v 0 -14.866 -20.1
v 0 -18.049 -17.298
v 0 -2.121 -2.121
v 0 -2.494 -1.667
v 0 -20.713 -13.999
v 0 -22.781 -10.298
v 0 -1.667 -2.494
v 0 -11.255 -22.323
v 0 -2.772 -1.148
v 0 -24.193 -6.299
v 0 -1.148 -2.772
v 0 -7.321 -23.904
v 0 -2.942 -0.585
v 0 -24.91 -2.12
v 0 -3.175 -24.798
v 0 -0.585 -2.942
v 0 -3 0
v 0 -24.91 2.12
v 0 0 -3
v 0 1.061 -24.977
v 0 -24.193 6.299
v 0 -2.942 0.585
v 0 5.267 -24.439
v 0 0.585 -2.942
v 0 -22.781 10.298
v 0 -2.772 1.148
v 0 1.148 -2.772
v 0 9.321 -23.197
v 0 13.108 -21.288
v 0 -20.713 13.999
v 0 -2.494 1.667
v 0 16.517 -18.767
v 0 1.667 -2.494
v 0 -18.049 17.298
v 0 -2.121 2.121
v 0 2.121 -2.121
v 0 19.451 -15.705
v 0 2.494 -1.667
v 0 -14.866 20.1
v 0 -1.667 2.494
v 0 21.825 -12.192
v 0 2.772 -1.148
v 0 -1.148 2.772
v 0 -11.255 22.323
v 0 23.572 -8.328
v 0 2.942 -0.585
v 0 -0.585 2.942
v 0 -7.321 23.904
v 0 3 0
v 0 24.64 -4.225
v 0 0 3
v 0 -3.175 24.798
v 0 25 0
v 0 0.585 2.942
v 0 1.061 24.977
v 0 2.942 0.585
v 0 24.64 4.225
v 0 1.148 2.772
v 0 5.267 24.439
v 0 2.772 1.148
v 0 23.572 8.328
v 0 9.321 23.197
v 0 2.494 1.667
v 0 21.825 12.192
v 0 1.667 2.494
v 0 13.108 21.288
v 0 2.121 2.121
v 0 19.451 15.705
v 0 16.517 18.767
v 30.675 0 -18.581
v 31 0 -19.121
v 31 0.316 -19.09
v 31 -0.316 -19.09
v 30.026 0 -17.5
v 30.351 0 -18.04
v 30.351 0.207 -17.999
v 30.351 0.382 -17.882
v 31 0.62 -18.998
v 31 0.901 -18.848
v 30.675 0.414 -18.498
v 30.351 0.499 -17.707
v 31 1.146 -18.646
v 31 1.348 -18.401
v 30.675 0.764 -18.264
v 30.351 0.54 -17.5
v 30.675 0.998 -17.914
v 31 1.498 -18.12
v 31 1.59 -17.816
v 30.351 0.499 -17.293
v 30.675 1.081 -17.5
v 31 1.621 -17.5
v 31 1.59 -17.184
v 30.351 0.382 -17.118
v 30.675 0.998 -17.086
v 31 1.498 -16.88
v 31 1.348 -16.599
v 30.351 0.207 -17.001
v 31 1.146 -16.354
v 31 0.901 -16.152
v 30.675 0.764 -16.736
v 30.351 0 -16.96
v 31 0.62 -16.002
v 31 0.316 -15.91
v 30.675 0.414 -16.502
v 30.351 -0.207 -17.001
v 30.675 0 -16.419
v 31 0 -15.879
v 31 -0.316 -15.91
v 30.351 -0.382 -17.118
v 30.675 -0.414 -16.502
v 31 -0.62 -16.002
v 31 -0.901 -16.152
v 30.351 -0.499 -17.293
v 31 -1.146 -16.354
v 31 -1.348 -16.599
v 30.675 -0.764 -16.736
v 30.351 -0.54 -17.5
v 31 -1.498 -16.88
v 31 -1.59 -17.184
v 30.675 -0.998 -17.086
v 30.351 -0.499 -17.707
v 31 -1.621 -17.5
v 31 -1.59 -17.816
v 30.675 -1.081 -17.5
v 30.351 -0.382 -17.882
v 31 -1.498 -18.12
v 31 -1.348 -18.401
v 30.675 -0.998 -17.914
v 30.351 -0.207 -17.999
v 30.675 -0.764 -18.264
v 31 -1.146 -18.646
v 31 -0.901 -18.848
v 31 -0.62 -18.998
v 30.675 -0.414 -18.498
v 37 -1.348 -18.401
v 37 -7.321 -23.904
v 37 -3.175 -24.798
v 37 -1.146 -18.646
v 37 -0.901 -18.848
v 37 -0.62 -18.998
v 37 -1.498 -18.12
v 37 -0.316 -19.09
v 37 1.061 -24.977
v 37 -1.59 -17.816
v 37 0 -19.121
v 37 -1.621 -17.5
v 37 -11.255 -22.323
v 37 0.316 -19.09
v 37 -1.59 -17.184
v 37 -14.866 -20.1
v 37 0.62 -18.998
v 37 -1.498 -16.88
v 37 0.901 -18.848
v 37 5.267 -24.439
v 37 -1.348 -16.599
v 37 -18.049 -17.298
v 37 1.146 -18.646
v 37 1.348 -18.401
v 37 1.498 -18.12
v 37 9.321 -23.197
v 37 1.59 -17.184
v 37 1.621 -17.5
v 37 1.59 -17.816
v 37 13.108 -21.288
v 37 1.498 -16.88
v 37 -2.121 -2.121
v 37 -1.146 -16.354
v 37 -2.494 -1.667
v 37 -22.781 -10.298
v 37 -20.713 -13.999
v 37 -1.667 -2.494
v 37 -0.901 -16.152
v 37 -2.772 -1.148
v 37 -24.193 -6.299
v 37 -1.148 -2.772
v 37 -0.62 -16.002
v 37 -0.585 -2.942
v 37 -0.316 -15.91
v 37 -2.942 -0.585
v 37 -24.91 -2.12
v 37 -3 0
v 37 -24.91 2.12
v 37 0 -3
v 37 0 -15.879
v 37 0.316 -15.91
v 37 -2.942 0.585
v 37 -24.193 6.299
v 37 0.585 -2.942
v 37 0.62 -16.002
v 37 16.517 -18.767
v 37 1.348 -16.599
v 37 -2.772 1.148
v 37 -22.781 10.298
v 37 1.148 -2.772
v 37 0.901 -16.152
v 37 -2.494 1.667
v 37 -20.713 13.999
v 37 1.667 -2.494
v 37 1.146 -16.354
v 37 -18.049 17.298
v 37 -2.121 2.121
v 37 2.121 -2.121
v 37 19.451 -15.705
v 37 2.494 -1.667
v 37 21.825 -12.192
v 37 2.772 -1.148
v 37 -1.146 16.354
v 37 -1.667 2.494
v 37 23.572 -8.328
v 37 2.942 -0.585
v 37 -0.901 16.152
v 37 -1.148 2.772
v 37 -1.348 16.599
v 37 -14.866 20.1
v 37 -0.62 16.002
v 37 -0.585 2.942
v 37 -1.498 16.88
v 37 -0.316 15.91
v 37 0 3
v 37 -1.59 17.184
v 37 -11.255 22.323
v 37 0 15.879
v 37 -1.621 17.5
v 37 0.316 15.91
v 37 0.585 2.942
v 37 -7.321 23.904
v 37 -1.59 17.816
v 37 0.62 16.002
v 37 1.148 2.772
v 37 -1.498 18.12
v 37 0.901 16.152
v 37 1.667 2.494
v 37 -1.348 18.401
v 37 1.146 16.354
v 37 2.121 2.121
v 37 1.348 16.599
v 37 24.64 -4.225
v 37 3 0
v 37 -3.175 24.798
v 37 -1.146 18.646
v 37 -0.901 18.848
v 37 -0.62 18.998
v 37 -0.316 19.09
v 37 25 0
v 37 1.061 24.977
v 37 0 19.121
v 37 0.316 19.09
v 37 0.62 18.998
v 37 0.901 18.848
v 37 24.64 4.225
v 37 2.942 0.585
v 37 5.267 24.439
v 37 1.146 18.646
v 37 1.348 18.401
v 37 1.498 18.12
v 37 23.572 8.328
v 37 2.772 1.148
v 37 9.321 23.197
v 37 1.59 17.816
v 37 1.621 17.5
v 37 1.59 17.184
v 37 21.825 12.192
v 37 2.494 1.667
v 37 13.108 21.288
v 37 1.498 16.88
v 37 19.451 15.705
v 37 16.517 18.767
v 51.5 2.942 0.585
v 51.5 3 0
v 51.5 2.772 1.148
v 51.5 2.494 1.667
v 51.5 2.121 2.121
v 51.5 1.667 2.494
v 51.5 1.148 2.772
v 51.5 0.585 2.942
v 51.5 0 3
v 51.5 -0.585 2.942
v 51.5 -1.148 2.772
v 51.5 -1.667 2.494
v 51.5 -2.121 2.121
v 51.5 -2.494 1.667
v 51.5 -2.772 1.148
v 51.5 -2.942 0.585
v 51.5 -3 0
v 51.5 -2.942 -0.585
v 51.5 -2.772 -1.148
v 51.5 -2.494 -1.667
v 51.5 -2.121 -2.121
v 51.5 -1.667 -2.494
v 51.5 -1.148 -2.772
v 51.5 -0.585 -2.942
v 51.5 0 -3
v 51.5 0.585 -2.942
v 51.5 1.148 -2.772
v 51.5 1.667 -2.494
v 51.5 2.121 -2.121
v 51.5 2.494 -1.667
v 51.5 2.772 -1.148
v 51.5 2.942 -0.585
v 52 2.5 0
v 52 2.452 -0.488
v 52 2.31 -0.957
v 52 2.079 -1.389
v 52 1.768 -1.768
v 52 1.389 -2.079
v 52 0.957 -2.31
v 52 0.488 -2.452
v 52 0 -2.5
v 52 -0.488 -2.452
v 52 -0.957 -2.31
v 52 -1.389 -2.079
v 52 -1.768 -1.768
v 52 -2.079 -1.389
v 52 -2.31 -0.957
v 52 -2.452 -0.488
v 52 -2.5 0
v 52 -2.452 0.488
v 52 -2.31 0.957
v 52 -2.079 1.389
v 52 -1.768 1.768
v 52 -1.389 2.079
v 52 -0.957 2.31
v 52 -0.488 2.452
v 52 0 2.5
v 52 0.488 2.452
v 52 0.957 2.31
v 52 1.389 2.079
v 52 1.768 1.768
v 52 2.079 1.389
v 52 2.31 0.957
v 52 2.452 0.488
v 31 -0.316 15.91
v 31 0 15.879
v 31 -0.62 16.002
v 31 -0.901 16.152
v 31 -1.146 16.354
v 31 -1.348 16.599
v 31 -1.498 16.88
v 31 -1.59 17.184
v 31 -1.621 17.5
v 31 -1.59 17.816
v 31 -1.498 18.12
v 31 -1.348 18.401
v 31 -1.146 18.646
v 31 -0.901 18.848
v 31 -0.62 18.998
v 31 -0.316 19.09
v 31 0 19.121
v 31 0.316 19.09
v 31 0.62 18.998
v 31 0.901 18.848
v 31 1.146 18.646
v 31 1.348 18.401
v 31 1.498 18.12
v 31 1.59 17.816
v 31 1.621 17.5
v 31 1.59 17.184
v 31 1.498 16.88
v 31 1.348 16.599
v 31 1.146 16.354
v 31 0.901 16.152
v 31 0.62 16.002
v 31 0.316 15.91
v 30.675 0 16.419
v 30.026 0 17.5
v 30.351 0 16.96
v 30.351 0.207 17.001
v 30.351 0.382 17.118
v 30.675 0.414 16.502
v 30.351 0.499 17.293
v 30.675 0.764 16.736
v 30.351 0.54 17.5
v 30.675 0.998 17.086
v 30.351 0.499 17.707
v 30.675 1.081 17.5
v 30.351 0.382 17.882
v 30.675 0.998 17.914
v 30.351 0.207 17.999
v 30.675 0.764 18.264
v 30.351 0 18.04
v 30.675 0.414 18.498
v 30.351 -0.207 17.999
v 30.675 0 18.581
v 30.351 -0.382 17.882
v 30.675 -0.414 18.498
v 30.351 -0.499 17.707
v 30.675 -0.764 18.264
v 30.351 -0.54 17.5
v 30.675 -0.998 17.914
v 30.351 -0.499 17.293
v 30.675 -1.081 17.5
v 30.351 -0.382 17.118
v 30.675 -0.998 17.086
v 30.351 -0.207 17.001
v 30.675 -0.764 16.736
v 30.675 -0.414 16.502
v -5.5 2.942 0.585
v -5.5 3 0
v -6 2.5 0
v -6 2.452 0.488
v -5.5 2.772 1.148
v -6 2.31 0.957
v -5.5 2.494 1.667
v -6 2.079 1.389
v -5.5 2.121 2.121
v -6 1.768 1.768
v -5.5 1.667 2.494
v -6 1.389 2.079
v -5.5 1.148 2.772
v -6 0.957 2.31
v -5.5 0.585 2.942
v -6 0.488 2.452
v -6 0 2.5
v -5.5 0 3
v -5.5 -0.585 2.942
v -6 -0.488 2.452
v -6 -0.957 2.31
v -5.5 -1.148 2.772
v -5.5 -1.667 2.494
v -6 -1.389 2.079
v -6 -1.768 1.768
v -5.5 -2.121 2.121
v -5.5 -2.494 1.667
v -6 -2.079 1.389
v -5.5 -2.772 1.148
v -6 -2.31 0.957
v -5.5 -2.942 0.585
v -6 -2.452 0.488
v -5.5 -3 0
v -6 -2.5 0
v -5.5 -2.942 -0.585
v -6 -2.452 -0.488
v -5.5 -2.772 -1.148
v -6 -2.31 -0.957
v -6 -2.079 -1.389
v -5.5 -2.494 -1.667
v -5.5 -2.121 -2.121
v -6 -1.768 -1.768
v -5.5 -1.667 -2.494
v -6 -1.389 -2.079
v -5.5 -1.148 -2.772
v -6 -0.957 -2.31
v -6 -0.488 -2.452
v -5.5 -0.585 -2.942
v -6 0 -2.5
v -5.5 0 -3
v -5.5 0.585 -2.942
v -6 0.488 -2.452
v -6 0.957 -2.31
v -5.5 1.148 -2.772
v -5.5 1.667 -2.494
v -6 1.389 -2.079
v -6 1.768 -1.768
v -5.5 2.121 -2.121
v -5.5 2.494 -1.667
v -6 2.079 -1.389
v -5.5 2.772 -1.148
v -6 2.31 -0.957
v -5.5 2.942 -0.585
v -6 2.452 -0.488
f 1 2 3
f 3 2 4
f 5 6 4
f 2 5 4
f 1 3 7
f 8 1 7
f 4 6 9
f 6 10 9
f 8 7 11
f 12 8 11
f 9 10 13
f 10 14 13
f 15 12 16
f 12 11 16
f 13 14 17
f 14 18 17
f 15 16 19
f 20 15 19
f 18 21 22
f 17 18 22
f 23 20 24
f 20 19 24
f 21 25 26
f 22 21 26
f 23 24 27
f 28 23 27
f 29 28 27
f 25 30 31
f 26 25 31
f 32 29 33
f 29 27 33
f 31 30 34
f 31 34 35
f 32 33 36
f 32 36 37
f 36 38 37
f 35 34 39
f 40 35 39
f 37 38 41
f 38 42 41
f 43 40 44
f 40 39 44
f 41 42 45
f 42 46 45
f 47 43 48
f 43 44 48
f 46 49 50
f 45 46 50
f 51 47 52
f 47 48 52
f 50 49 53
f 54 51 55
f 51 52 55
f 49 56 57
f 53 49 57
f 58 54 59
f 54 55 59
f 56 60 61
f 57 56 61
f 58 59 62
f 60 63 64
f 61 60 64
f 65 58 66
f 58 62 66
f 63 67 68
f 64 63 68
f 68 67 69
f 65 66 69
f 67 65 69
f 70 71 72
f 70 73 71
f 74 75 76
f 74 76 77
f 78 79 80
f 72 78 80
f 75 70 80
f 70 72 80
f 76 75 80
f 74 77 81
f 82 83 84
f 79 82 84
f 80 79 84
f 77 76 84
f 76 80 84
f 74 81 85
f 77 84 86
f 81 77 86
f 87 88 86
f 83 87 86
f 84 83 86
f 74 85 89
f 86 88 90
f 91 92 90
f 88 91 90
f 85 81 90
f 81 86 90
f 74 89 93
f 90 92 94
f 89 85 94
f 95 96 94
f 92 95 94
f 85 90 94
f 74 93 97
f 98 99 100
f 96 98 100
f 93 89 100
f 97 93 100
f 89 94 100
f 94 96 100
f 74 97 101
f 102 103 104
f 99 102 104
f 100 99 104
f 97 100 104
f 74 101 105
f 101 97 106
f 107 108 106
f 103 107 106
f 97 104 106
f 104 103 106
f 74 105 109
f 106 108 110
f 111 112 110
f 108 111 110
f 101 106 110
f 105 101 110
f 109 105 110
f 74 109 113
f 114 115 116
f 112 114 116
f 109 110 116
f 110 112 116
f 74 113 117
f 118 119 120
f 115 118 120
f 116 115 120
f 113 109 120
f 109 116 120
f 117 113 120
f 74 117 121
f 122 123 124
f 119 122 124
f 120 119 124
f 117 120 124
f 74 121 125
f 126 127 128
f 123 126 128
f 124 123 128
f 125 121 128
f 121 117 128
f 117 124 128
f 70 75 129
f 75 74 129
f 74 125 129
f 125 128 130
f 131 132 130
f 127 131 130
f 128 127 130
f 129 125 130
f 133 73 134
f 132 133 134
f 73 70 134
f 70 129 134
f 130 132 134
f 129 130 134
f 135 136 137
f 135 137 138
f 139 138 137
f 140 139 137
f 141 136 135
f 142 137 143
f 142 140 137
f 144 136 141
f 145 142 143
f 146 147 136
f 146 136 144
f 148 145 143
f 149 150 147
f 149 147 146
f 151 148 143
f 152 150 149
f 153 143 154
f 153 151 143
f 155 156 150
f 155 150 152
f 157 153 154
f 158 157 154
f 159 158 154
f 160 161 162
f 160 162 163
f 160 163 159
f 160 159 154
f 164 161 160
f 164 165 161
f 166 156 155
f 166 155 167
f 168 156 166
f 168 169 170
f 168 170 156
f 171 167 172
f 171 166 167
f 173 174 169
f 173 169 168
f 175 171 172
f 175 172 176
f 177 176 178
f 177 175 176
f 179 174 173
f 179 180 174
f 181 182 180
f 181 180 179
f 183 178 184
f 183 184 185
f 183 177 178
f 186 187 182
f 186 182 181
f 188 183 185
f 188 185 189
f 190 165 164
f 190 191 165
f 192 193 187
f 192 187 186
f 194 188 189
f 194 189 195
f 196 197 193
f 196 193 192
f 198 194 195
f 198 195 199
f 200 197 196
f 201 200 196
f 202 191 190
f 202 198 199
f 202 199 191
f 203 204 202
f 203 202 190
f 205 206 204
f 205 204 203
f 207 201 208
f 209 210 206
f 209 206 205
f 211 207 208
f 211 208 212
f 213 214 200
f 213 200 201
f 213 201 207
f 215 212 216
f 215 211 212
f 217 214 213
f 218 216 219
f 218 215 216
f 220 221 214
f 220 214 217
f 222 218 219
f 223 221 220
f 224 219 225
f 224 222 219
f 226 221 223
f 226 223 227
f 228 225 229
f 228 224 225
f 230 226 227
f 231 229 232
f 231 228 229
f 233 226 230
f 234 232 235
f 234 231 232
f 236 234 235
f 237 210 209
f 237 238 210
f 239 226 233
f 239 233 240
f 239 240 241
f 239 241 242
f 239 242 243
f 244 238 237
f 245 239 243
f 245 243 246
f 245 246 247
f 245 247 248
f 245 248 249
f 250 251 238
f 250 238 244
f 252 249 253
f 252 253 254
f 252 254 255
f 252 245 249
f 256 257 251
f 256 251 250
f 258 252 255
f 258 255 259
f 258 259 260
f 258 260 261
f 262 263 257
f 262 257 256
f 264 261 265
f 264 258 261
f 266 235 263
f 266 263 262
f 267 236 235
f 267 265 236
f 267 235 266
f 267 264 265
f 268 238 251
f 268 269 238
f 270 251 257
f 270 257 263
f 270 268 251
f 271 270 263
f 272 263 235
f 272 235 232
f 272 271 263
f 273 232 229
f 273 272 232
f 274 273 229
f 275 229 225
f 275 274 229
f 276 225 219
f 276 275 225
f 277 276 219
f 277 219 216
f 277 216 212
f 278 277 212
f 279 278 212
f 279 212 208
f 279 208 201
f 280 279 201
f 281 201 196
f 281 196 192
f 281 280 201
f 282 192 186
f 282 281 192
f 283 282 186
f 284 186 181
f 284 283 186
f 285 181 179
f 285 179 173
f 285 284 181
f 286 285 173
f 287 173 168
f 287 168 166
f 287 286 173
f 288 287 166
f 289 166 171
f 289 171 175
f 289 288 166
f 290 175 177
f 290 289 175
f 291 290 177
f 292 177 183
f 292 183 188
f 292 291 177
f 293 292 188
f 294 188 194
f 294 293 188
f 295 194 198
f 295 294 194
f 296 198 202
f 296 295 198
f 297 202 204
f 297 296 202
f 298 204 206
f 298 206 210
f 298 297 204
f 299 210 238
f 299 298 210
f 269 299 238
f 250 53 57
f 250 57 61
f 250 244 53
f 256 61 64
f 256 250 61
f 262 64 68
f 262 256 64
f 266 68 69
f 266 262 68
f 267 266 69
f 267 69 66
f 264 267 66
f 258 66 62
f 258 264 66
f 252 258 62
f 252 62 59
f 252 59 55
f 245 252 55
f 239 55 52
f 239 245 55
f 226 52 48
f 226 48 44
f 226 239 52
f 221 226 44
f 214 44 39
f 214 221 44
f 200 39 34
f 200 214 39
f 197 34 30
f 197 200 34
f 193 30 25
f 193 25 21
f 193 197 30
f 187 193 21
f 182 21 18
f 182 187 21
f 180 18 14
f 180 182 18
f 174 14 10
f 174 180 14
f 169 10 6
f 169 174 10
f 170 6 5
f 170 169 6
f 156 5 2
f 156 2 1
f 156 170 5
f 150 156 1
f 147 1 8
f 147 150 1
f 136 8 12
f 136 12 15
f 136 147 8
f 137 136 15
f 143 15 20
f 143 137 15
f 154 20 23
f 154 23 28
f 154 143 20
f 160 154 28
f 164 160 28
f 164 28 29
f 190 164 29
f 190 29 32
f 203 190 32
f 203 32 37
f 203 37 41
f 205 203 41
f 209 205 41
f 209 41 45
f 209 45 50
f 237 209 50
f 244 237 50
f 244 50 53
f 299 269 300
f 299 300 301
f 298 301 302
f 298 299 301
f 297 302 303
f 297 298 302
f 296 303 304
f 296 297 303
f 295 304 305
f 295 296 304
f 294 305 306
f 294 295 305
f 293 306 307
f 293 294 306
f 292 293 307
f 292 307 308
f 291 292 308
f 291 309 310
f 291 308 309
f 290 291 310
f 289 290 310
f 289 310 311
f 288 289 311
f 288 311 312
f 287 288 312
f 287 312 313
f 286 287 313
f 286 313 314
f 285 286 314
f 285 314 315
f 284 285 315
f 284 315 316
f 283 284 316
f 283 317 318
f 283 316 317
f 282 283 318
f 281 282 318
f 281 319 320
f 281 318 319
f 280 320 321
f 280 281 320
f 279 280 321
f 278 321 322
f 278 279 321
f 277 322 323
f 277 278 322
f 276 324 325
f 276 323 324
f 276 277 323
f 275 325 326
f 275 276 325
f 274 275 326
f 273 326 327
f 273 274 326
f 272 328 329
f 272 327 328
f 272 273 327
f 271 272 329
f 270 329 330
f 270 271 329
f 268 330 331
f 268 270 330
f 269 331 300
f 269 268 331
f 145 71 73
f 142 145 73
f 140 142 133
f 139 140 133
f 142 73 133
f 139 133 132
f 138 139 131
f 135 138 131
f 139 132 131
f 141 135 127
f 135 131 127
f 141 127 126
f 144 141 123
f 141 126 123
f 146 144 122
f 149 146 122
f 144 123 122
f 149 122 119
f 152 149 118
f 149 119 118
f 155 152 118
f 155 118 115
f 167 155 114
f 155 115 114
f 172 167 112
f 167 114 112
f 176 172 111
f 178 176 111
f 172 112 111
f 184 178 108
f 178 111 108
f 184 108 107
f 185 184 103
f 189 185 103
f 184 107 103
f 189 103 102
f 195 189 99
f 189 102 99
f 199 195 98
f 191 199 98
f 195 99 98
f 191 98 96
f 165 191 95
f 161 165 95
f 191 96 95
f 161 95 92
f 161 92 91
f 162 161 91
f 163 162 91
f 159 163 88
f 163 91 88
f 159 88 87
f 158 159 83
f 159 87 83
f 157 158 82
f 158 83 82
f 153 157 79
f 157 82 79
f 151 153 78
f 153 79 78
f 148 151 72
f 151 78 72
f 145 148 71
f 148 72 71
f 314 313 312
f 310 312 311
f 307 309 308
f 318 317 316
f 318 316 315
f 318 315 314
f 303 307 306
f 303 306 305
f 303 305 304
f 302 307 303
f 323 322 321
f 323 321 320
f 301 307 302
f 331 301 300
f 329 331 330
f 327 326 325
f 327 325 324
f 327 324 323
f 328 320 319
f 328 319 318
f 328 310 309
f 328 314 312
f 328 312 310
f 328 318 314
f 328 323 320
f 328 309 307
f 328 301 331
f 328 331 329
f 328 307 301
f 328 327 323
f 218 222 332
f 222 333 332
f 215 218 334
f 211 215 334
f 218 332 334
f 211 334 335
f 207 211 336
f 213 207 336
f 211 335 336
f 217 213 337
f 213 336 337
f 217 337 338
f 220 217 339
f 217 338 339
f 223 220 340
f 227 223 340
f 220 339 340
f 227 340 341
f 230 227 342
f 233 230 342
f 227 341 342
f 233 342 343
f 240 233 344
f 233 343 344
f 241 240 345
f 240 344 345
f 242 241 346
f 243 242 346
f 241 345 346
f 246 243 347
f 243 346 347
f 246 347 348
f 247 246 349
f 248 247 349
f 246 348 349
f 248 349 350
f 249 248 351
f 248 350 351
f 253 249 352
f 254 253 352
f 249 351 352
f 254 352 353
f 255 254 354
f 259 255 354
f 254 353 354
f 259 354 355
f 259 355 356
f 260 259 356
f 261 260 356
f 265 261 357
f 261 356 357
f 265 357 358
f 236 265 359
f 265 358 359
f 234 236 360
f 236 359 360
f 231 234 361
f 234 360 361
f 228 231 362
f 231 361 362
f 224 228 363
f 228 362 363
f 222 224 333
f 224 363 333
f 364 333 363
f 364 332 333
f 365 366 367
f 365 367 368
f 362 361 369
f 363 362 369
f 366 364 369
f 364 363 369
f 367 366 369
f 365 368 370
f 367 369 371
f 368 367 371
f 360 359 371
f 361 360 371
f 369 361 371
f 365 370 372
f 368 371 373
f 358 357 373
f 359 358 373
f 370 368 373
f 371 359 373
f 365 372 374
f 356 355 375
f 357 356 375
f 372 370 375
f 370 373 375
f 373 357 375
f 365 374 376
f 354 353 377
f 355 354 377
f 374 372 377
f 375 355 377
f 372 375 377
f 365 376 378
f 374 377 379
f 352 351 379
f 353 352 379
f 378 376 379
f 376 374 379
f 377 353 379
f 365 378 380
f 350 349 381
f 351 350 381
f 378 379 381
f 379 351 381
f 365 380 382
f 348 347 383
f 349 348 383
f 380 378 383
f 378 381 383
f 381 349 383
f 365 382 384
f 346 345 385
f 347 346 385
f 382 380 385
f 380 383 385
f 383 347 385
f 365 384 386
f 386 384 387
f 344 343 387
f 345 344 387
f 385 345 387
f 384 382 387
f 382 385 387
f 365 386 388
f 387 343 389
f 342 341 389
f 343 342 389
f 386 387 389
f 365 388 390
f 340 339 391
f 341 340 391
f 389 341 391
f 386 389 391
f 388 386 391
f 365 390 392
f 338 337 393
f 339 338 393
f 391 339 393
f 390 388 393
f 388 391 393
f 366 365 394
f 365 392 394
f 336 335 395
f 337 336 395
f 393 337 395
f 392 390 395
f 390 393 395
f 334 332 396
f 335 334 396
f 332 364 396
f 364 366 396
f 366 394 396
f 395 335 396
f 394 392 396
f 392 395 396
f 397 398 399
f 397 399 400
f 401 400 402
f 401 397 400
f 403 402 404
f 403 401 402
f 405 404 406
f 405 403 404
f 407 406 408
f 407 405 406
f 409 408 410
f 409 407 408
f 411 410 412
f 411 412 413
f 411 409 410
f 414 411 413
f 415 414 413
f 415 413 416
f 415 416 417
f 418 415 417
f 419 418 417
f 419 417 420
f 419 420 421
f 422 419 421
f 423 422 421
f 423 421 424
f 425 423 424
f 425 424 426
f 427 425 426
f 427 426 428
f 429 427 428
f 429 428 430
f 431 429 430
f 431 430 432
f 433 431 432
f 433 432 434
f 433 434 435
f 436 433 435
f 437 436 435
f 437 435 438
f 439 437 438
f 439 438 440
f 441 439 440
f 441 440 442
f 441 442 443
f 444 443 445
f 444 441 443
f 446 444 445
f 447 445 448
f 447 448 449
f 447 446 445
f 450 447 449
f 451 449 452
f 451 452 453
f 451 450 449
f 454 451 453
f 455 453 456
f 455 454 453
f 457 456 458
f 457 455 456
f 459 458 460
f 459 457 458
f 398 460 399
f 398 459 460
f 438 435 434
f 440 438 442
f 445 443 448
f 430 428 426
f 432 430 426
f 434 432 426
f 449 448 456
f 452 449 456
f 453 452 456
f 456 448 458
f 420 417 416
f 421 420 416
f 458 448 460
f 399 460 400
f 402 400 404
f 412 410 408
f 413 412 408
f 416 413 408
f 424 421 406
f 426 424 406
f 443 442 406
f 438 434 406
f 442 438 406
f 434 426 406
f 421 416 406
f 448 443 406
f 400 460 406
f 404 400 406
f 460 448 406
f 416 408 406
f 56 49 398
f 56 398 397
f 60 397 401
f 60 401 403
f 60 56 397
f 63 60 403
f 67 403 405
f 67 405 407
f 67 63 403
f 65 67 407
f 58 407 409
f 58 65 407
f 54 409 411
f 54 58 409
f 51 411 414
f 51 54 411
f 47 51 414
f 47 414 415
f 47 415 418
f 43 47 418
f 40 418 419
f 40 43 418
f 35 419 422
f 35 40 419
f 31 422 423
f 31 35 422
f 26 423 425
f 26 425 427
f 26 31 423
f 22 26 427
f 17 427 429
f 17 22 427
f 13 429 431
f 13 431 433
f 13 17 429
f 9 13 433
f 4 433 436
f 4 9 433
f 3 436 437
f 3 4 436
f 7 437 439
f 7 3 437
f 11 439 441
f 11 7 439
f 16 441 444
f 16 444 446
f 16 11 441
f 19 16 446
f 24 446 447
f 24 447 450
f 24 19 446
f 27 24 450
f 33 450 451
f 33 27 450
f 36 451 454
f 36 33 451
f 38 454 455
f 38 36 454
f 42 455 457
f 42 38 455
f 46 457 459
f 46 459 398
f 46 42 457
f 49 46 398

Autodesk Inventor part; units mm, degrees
ref_plane "YZ Plane" through (0, 0, 0) normal (1, 0, 0) x (0, 1, 0)
ref_plane "XZ Plane" through (0, 0, 0) normal (0, 1, 0) x (-1, 0, 0)
ref_plane "XY Plane" through (0, 0, 0) normal (0, 0, 1) x (1, 0, 0)
sketch "Skizze1" plane through (0, 0, 0) normal (0, 0, 1) x (1, 0, 0)
  line L0 (0, 30) -> (0, -5) projected
  line L1 (-17.6, 0) -> (63.6, 0) projected
  line L2 (-6, 0) -> (-6, 3)
  line L3 (-6, 3) -> (0, 3)
  line L4 (0, 3) -> (0, 25)
  line L5 (0, 25) -> (37, 25)
  line L6 (37, 25) -> (37, 3)
  line L7 (37, 3) -> (52, 3)
  line L8 (52, 3) -> (52, 0)
  point P0 (0, 0)
  dimension "d0" = 15
  dimension "d2" = 37
  dimension "d3" = 58
  dimension "d4" = 25
  dimension "d5" = 3
  dimension "d6" = 3
revolve "Umdrehung1" add sketch "Skizze1" angle 360 about axis through (0, 0, 0) along (1, 0, 0)
sketch "Skizze2" plane through (37, 0, 0) normal (1, 0, 0) x (0, 0, -1)
  circle A0 centre (0, 0) radius 3 projected
  point P0 (-17.5, 0)
  point P1 (17.5, 0)
  dimension "d8" = 35
  dimension "d9" = 17.5
hole "Bohrung1" at (37, 0, 17.5) at (37, 0, -17.5) direction (-1, 0, 0) diameter 3.242 depth 6 tip angle 118 thread size "M4x0.7" class "6H" standard "ISO Metric profile"
chamfer "Fase1" distance 0.5 angle 45 2 edges at (52, -3, 0) (-6, -3, 0)
equation "\"d9\" = 0.5 * d8"
equation "\"d6\" = d5"
properties part number "Motor50" material "Steel"
